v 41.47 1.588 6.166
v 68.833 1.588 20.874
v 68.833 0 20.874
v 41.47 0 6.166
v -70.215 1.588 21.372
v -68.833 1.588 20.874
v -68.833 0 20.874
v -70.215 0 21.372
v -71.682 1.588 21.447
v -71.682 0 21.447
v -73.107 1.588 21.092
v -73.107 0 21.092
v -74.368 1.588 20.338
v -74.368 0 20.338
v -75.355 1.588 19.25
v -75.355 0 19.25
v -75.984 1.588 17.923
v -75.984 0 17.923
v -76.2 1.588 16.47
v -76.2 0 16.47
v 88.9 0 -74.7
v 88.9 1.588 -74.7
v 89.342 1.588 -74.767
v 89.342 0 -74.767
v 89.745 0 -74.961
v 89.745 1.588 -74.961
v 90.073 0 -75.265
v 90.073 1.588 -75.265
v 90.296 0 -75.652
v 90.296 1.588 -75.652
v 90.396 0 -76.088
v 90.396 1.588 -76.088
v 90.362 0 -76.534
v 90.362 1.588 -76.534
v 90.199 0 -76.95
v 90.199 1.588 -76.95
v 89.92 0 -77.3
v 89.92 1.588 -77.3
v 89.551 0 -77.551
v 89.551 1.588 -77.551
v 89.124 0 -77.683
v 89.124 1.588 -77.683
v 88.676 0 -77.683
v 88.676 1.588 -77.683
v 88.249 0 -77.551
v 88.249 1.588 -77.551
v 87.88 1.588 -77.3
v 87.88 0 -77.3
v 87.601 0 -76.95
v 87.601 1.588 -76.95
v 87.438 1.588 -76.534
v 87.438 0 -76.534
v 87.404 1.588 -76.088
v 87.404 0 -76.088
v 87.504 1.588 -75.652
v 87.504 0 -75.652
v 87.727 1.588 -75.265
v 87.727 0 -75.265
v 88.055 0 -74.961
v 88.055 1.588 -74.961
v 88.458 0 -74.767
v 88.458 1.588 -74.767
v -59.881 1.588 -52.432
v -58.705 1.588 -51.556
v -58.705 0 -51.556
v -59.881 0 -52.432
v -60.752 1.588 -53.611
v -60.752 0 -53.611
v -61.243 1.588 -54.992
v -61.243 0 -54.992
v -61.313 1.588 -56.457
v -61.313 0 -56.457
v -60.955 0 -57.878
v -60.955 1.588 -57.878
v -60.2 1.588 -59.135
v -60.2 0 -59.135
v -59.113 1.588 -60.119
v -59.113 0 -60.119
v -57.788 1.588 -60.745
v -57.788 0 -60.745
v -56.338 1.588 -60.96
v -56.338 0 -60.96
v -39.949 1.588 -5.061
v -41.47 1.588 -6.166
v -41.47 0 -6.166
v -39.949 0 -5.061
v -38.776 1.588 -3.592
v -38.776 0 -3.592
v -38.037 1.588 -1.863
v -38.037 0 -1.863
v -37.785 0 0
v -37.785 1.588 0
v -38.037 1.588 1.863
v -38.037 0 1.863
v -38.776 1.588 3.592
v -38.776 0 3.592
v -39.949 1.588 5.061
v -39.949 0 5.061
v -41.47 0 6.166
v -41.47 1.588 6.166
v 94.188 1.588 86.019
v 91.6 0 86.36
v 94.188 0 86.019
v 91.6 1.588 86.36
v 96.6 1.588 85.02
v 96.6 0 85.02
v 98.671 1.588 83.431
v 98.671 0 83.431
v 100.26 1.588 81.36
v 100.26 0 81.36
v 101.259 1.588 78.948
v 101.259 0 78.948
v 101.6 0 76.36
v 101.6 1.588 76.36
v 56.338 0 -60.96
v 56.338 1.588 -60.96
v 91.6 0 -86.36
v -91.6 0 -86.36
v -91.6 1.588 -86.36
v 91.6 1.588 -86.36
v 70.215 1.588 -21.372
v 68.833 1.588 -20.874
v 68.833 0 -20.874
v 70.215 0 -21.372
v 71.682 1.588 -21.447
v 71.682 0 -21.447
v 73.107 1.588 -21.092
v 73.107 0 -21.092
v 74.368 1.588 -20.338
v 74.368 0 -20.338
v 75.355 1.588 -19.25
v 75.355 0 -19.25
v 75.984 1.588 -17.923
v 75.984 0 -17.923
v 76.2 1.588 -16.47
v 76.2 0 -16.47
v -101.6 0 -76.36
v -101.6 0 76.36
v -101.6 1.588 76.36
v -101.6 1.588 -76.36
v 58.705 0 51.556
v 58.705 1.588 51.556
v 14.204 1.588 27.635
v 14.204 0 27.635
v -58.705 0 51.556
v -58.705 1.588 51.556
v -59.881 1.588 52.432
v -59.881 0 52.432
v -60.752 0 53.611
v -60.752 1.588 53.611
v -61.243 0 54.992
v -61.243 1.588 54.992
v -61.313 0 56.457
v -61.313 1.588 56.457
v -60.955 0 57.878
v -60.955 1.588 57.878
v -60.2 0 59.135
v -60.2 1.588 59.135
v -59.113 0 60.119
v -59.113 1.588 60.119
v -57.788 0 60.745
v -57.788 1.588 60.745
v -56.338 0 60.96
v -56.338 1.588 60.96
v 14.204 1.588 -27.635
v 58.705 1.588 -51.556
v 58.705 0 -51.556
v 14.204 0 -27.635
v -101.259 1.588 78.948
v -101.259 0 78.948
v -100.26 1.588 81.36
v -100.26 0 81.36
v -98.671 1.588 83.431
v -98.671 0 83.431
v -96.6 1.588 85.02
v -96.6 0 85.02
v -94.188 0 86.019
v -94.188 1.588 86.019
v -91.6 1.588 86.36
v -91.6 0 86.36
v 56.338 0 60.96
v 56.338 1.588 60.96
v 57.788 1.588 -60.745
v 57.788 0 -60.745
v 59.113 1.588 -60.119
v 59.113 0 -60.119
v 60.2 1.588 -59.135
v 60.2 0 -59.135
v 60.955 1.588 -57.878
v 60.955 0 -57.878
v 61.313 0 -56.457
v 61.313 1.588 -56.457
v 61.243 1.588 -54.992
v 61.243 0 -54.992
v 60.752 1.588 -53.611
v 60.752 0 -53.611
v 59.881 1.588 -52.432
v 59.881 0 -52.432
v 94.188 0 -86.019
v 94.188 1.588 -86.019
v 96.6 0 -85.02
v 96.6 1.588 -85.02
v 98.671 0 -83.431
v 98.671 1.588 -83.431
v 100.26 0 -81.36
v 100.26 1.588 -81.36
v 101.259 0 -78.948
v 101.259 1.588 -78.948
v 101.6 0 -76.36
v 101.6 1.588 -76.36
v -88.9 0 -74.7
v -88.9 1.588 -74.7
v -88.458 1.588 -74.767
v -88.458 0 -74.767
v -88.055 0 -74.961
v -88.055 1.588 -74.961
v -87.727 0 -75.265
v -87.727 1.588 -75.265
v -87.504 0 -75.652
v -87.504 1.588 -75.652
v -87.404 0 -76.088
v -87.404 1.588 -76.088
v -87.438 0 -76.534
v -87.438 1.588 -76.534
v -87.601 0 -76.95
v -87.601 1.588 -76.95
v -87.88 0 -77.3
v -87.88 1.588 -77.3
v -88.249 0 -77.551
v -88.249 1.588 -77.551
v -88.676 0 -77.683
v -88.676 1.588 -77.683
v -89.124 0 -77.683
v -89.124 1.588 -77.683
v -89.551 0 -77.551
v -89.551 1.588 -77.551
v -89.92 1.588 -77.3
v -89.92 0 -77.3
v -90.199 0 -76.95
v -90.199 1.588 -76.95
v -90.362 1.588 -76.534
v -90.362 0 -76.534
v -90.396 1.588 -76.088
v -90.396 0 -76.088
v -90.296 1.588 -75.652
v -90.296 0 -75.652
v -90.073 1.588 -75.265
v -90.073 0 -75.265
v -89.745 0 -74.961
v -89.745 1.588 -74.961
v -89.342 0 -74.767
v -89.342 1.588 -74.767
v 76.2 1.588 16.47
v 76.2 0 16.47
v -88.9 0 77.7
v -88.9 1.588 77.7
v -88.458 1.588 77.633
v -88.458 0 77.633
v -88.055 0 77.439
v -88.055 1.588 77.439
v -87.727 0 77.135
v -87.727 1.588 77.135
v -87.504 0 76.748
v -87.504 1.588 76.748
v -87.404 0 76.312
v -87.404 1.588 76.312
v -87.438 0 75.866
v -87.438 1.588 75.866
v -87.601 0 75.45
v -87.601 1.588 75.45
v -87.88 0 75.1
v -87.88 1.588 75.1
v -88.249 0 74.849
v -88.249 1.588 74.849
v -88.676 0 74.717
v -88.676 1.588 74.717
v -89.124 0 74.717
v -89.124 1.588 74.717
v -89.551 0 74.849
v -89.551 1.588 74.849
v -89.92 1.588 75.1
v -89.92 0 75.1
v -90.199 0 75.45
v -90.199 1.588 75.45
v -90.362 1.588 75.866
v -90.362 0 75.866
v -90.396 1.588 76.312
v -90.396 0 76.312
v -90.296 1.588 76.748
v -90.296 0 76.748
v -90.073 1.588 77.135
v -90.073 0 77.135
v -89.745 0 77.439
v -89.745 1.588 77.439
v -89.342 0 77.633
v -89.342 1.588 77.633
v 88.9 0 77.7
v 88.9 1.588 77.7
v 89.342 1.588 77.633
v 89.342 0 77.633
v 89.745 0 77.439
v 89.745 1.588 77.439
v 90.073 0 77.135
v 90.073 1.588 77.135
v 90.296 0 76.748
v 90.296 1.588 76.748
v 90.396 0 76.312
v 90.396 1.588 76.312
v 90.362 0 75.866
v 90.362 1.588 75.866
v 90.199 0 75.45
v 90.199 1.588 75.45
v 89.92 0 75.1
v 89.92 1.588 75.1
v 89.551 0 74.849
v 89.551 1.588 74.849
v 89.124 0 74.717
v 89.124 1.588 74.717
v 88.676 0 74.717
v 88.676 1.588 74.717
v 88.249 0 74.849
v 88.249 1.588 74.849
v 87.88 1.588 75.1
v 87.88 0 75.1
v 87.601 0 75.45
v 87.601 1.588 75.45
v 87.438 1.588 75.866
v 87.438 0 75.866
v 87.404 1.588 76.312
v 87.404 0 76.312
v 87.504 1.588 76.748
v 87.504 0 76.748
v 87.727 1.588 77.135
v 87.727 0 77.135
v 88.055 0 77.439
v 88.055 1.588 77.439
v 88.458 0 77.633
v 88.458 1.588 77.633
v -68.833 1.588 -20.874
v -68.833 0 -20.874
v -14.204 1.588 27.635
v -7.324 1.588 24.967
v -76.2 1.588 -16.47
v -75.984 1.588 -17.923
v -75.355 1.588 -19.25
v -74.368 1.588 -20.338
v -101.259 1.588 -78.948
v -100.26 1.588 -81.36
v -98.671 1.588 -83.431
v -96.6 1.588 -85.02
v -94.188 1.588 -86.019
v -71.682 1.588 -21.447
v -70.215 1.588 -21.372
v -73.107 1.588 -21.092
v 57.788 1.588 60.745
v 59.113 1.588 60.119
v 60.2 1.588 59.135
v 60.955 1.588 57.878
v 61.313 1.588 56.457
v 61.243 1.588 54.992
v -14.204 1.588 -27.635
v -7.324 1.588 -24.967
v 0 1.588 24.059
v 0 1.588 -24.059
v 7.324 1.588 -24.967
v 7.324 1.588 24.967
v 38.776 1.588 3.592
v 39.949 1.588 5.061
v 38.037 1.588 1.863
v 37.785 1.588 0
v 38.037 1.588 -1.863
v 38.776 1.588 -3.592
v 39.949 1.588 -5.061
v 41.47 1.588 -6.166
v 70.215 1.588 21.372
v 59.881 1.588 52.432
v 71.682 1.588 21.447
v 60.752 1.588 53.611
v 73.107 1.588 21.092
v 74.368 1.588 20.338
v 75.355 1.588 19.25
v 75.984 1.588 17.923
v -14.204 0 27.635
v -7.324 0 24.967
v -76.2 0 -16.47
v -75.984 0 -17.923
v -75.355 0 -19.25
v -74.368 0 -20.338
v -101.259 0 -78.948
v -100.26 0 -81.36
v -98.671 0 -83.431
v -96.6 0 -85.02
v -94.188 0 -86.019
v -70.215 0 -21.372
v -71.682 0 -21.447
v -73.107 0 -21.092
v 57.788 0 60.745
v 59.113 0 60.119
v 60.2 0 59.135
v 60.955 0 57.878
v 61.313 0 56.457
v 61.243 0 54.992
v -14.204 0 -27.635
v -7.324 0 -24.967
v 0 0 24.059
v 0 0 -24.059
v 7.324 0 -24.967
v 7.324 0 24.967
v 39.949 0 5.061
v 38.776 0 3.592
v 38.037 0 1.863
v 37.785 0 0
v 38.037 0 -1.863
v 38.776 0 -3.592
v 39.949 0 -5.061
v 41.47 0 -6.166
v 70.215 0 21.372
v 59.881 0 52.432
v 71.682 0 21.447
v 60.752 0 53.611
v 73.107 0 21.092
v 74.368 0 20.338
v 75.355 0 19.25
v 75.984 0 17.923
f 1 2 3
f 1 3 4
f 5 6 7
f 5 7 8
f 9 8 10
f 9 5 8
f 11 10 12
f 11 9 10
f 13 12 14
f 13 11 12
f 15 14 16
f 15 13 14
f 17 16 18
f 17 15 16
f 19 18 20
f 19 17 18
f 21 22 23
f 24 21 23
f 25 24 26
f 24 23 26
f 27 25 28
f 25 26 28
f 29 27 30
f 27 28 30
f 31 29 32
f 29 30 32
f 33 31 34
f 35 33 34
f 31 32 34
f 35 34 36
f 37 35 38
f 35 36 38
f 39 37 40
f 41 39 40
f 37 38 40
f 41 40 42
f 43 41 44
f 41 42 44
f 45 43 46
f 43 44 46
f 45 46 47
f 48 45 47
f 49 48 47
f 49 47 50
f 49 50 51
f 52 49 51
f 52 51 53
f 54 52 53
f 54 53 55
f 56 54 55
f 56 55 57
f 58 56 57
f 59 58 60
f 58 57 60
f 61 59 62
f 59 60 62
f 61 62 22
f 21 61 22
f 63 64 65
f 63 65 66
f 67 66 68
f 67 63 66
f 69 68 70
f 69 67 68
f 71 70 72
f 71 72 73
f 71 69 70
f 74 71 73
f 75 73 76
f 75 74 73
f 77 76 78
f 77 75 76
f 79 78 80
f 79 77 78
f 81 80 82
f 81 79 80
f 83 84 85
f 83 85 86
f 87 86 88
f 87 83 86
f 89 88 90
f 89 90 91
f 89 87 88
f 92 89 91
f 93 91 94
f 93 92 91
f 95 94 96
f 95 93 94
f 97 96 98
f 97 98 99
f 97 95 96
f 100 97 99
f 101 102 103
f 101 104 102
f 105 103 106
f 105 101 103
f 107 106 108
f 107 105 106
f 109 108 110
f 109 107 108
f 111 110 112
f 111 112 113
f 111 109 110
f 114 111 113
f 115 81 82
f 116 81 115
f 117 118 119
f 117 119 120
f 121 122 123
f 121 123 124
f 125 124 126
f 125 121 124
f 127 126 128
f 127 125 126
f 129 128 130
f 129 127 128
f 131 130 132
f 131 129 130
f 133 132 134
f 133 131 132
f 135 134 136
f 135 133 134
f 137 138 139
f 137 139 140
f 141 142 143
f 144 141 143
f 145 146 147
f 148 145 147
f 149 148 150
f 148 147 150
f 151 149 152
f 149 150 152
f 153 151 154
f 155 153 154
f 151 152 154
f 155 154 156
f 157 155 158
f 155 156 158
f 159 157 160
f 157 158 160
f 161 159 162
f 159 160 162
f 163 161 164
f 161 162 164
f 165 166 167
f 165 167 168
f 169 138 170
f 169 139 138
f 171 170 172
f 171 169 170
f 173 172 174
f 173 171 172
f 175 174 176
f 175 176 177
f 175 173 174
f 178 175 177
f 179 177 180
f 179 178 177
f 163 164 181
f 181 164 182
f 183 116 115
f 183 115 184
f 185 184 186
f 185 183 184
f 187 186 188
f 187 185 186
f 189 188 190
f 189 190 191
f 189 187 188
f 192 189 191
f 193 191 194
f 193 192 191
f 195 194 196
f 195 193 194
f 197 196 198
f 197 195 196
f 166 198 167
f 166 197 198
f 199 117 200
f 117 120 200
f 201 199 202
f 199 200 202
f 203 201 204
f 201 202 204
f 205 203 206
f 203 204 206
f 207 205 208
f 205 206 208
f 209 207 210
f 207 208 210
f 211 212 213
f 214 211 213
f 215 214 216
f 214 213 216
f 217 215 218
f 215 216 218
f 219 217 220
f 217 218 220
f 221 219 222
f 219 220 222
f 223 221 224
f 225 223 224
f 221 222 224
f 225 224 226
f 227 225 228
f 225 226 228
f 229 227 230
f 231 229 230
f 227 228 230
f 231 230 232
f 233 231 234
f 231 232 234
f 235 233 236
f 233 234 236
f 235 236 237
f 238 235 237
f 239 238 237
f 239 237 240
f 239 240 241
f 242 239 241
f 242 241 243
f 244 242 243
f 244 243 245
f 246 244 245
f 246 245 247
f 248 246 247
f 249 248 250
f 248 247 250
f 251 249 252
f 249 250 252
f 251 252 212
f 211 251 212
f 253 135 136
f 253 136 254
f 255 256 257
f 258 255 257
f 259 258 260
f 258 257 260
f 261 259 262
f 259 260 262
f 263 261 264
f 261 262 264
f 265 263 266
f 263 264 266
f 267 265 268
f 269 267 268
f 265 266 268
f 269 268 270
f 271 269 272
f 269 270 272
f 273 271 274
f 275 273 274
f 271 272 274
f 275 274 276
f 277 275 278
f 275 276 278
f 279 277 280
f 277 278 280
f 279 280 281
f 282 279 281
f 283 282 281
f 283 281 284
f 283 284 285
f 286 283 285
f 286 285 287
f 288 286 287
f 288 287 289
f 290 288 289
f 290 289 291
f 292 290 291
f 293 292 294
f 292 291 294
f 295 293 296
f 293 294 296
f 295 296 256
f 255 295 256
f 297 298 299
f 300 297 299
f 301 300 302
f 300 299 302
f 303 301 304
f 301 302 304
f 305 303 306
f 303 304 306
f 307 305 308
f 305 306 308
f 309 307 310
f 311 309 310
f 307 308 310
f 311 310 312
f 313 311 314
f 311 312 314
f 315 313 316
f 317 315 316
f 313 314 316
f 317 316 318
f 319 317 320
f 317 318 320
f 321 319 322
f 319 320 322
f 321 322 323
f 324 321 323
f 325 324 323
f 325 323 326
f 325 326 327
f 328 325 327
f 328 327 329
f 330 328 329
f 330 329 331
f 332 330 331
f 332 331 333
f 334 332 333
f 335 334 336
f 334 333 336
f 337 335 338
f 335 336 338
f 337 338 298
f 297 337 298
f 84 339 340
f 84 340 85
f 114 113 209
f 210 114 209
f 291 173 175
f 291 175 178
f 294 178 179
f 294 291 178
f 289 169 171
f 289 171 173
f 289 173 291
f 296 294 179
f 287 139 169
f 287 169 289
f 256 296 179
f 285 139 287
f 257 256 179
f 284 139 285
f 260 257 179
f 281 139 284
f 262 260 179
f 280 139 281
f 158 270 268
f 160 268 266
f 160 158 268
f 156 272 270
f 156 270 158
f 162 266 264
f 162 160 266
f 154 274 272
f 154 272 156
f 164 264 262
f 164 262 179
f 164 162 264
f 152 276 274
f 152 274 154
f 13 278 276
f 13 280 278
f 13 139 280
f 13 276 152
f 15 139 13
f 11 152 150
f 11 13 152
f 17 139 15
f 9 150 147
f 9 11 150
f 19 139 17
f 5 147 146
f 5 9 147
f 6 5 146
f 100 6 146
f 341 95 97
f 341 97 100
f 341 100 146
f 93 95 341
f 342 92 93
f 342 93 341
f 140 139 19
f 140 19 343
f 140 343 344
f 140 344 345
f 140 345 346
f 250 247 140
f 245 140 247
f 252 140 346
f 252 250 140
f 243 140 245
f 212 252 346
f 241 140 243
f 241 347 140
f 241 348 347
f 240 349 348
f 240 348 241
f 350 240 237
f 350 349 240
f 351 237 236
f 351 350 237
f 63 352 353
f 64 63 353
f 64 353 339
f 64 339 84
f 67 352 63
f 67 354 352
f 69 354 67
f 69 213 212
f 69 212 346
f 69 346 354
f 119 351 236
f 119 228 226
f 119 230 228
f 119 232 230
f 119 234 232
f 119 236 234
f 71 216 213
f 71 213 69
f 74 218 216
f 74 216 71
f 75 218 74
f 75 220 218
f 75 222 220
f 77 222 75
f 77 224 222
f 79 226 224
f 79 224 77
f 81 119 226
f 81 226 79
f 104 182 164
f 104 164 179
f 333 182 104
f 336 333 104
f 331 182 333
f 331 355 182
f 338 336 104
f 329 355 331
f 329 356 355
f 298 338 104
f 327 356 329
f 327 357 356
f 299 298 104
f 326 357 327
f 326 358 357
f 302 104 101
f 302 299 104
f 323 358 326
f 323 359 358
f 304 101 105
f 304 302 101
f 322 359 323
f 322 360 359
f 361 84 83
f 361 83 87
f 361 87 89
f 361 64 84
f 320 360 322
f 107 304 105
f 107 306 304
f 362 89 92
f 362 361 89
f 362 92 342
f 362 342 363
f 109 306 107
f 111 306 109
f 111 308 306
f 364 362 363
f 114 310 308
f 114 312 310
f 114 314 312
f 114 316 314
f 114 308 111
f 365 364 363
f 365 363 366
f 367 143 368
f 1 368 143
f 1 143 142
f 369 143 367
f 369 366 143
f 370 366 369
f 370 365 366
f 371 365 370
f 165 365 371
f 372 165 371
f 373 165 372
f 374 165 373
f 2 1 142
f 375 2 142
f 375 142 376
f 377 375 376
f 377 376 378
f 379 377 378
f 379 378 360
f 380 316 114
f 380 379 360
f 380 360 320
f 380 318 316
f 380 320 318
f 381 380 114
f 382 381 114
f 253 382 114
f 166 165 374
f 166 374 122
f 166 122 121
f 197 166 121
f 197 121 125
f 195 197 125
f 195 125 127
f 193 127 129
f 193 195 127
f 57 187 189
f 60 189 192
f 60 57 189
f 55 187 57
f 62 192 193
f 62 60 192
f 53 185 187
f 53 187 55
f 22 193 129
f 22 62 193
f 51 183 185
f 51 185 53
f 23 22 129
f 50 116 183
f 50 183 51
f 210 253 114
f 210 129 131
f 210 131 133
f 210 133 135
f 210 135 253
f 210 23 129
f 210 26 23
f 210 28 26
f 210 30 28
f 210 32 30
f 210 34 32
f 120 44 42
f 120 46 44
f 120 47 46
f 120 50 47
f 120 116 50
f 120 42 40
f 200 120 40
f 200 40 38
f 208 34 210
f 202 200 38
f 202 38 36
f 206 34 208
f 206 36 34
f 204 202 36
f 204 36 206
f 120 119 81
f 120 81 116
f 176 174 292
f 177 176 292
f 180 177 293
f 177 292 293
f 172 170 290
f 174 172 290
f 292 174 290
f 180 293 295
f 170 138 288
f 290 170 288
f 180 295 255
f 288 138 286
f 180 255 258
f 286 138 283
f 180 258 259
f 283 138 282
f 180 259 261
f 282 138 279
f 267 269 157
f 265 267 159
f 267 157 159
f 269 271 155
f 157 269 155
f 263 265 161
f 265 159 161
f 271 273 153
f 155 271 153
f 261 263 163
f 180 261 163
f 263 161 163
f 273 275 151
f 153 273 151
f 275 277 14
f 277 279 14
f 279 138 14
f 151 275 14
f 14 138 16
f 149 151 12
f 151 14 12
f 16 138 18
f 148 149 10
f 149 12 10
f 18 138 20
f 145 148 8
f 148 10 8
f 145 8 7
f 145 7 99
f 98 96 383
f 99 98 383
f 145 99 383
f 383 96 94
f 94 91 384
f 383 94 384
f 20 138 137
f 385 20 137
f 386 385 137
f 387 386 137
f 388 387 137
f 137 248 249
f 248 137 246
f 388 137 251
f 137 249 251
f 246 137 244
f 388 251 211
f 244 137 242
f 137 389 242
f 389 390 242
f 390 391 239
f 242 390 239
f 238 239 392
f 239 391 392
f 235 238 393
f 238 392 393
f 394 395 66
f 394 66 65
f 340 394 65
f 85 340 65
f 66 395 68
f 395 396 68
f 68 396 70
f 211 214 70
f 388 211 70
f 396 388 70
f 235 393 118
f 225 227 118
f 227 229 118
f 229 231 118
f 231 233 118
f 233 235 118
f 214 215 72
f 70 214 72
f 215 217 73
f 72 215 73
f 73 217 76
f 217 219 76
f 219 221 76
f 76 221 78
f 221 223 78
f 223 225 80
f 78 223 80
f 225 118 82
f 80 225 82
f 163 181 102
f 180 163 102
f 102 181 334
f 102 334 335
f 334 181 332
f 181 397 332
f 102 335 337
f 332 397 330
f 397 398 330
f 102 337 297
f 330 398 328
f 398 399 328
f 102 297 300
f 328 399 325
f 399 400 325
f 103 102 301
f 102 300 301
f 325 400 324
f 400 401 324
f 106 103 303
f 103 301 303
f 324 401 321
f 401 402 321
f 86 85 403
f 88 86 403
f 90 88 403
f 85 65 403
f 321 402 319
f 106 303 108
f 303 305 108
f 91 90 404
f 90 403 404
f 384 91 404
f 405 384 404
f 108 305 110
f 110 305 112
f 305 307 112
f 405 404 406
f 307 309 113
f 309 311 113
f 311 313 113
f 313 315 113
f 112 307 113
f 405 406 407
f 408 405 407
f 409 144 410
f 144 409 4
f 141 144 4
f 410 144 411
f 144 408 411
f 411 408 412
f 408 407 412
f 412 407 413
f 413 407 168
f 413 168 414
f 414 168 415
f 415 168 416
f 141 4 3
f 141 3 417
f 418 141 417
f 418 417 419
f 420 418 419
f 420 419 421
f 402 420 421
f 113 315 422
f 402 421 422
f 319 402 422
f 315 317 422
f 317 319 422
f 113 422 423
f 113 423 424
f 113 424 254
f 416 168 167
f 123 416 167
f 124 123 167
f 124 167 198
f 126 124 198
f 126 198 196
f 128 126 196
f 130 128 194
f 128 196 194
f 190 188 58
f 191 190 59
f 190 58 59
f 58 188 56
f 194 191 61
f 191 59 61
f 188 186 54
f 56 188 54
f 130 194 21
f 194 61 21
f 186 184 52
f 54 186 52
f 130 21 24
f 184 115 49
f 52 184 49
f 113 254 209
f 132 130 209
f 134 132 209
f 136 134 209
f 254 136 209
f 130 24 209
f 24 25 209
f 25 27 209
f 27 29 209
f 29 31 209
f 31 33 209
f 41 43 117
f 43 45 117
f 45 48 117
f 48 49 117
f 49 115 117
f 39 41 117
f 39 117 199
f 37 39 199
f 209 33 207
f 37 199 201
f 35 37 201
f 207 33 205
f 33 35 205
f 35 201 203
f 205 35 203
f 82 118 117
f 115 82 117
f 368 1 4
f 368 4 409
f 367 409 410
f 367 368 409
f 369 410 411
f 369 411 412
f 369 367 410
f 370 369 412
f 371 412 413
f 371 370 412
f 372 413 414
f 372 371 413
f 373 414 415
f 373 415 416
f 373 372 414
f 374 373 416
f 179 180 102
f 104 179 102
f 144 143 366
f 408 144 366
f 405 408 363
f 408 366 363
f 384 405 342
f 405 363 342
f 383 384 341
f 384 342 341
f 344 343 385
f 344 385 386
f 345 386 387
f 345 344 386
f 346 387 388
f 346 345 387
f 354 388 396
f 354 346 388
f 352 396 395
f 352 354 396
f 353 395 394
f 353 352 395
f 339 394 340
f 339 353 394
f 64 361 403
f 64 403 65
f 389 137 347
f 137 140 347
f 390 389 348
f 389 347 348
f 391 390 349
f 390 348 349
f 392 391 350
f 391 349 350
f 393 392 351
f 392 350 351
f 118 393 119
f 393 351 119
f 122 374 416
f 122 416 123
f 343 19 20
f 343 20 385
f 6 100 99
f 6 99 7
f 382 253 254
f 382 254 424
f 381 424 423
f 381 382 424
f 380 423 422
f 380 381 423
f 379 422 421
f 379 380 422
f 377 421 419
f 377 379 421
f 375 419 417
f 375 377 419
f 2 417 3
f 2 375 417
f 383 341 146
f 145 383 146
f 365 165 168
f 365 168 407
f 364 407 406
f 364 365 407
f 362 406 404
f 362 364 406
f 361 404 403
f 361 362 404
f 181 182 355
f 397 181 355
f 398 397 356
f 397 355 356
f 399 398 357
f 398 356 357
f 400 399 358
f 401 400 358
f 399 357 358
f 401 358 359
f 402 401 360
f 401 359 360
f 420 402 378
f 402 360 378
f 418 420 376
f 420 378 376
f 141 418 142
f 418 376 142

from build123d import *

# Parameters (mm, degrees)
SKETCH1_W           = 203.2
SKETCH1_H           = 172.72
BOSS_EXTRUDE1_DEPTH = 1.5875
CUT_EXTRUDE1_DEPTH  = 1.5875
SKETCH3_R           = 1.5
CUT_EXTRUDE2_DEPTH  = 1.5875
FILLET1_R           = 10


with BuildPart() as part:
    # Sketch1 → Boss-Extrude1 (new body)
    with BuildSketch(Plane(origin=(0, 0, 0), x_dir=(1, 0, 0), z_dir=(0, 1, 0))):
        Rectangle(SKETCH1_W, SKETCH1_H)
    extrude(amount=BOSS_EXTRUDE1_DEPTH)

    # Sketch2 → Cut-Extrude1 (cut)
    with BuildSketch(Plane(origin=(0, 1.5875, 0), x_dir=(1, 0, 0), z_dir=(0, 1, 0))):
        with BuildLine():
            Line((-56.337811401, 60.96), (56.337811401, 60.96))
            ThreePointArc((56.337811401, 60.96), (61.186538483, 57.180592348), (58.70513907, 51.555938272))
            Line((58.70513907, 51.555938272), (14.203966015, 27.635097742))
            ThreePointArc((14.203966015, 27.635097742), (0, 24.059468112), (-14.203966015, 27.635097742))
            Line((-14.203966015, 27.635097742), (-58.70513907, 51.555938272))
            ThreePointArc((-58.70513907, 51.555938272), (-61.186538483, 57.180592348), (-56.337811401, 60.96))
        make_face()
        with BuildLine():
            Line((-56.337811401, -60.96), (56.337811401, -60.96))
            ThreePointArc((56.337811401, -60.96), (61.186538483, -57.180592348), (58.70513907, -51.555938272))
            Line((58.70513907, -51.555938272), (14.203966015, -27.635097742))
            ThreePointArc((14.203966015, -27.635097742), (0, -24.059468112), (-14.203966015, -27.635097742))
            Line((-14.203966015, -27.635097742), (-58.70513907, -51.555938272))
            ThreePointArc((-58.70513907, -51.555938272), (-61.186538483, -57.180592348), (-56.337811401, -60.96))
        make_face()
        with BuildLine():
            Line((-68.832672331, 20.873835416), (-41.470344365, 6.16568642))
            ThreePointArc((-41.470344365, 6.16568642), (-37.784603101, 0), (-41.470344365, -6.16568642))
            Line((-41.470344365, -6.16568642), (-68.832672331, -20.873835416))
            ThreePointArc((-68.832672331, -20.873835416), (-73.765478674, -20.761430614), (-76.2, -16.469773687))
            Line((-76.2, -16.469773687), (-76.2, 16.469773687))
            ThreePointArc((-76.2, 16.469773687), (-73.765478674, 20.761430614), (-68.832672331, 20.873835416))
        make_face()
        with BuildLine():
            Line((41.470344365, 6.16568642), (68.832672331, 20.873835416))
            ThreePointArc((68.832672331, 20.873835416), (73.765478674, 20.761430614), (76.2, 16.469773687))
            Line((76.2, 16.469773687), (76.2, -16.469773687))
            ThreePointArc((76.2, -16.469773687), (73.765478674, -20.761430614), (68.832672331, -20.873835416))
            Line((68.832672331, -20.873835416), (41.470344365, -6.16568642))
            ThreePointArc((41.470344365, -6.16568642), (37.784603101, 0), (41.470344365, 6.16568642))
        make_face()
    extrude(amount=-CUT_EXTRUDE1_DEPTH, mode=Mode.SUBTRACT)

    # Sketch3 → Cut-Extrude2 (cut)
    with BuildSketch(Plane(origin=(0, 1.5875, 0), x_dir=(1, 0, 0), z_dir=(0, 1, 0))):
        with Locations(Location((-88.9, 76.2, 0), (0, 0, 270))):
            Circle(SKETCH3_R)
        with Locations(Location((88.9, 76.2, 0), (0, 0, 270))):
            Circle(SKETCH3_R)
        with Locations(Location((88.9, -76.2, 0), (0, 0, 270))):
            Circle(SKETCH3_R)
        with Locations(Location((-88.9, -76.2, 0), (0, 0, 270))):
            Circle(SKETCH3_R)
    extrude(amount=-CUT_EXTRUDE2_DEPTH, mode=Mode.SUBTRACT)

    # Fillet1
    fillet1_edges = [part.edges().sort_by_distance(p)[0] for p in [
        (101.6, 0.79375, 86.36),
        (-101.6, 0.79375, 86.36),
        (-101.6, 0.79375, -86.36),
        (101.6, 0.79375, -86.36),
    ]]
    fillet(fillet1_edges, radius=FILLET1_R)


solid = part.part
